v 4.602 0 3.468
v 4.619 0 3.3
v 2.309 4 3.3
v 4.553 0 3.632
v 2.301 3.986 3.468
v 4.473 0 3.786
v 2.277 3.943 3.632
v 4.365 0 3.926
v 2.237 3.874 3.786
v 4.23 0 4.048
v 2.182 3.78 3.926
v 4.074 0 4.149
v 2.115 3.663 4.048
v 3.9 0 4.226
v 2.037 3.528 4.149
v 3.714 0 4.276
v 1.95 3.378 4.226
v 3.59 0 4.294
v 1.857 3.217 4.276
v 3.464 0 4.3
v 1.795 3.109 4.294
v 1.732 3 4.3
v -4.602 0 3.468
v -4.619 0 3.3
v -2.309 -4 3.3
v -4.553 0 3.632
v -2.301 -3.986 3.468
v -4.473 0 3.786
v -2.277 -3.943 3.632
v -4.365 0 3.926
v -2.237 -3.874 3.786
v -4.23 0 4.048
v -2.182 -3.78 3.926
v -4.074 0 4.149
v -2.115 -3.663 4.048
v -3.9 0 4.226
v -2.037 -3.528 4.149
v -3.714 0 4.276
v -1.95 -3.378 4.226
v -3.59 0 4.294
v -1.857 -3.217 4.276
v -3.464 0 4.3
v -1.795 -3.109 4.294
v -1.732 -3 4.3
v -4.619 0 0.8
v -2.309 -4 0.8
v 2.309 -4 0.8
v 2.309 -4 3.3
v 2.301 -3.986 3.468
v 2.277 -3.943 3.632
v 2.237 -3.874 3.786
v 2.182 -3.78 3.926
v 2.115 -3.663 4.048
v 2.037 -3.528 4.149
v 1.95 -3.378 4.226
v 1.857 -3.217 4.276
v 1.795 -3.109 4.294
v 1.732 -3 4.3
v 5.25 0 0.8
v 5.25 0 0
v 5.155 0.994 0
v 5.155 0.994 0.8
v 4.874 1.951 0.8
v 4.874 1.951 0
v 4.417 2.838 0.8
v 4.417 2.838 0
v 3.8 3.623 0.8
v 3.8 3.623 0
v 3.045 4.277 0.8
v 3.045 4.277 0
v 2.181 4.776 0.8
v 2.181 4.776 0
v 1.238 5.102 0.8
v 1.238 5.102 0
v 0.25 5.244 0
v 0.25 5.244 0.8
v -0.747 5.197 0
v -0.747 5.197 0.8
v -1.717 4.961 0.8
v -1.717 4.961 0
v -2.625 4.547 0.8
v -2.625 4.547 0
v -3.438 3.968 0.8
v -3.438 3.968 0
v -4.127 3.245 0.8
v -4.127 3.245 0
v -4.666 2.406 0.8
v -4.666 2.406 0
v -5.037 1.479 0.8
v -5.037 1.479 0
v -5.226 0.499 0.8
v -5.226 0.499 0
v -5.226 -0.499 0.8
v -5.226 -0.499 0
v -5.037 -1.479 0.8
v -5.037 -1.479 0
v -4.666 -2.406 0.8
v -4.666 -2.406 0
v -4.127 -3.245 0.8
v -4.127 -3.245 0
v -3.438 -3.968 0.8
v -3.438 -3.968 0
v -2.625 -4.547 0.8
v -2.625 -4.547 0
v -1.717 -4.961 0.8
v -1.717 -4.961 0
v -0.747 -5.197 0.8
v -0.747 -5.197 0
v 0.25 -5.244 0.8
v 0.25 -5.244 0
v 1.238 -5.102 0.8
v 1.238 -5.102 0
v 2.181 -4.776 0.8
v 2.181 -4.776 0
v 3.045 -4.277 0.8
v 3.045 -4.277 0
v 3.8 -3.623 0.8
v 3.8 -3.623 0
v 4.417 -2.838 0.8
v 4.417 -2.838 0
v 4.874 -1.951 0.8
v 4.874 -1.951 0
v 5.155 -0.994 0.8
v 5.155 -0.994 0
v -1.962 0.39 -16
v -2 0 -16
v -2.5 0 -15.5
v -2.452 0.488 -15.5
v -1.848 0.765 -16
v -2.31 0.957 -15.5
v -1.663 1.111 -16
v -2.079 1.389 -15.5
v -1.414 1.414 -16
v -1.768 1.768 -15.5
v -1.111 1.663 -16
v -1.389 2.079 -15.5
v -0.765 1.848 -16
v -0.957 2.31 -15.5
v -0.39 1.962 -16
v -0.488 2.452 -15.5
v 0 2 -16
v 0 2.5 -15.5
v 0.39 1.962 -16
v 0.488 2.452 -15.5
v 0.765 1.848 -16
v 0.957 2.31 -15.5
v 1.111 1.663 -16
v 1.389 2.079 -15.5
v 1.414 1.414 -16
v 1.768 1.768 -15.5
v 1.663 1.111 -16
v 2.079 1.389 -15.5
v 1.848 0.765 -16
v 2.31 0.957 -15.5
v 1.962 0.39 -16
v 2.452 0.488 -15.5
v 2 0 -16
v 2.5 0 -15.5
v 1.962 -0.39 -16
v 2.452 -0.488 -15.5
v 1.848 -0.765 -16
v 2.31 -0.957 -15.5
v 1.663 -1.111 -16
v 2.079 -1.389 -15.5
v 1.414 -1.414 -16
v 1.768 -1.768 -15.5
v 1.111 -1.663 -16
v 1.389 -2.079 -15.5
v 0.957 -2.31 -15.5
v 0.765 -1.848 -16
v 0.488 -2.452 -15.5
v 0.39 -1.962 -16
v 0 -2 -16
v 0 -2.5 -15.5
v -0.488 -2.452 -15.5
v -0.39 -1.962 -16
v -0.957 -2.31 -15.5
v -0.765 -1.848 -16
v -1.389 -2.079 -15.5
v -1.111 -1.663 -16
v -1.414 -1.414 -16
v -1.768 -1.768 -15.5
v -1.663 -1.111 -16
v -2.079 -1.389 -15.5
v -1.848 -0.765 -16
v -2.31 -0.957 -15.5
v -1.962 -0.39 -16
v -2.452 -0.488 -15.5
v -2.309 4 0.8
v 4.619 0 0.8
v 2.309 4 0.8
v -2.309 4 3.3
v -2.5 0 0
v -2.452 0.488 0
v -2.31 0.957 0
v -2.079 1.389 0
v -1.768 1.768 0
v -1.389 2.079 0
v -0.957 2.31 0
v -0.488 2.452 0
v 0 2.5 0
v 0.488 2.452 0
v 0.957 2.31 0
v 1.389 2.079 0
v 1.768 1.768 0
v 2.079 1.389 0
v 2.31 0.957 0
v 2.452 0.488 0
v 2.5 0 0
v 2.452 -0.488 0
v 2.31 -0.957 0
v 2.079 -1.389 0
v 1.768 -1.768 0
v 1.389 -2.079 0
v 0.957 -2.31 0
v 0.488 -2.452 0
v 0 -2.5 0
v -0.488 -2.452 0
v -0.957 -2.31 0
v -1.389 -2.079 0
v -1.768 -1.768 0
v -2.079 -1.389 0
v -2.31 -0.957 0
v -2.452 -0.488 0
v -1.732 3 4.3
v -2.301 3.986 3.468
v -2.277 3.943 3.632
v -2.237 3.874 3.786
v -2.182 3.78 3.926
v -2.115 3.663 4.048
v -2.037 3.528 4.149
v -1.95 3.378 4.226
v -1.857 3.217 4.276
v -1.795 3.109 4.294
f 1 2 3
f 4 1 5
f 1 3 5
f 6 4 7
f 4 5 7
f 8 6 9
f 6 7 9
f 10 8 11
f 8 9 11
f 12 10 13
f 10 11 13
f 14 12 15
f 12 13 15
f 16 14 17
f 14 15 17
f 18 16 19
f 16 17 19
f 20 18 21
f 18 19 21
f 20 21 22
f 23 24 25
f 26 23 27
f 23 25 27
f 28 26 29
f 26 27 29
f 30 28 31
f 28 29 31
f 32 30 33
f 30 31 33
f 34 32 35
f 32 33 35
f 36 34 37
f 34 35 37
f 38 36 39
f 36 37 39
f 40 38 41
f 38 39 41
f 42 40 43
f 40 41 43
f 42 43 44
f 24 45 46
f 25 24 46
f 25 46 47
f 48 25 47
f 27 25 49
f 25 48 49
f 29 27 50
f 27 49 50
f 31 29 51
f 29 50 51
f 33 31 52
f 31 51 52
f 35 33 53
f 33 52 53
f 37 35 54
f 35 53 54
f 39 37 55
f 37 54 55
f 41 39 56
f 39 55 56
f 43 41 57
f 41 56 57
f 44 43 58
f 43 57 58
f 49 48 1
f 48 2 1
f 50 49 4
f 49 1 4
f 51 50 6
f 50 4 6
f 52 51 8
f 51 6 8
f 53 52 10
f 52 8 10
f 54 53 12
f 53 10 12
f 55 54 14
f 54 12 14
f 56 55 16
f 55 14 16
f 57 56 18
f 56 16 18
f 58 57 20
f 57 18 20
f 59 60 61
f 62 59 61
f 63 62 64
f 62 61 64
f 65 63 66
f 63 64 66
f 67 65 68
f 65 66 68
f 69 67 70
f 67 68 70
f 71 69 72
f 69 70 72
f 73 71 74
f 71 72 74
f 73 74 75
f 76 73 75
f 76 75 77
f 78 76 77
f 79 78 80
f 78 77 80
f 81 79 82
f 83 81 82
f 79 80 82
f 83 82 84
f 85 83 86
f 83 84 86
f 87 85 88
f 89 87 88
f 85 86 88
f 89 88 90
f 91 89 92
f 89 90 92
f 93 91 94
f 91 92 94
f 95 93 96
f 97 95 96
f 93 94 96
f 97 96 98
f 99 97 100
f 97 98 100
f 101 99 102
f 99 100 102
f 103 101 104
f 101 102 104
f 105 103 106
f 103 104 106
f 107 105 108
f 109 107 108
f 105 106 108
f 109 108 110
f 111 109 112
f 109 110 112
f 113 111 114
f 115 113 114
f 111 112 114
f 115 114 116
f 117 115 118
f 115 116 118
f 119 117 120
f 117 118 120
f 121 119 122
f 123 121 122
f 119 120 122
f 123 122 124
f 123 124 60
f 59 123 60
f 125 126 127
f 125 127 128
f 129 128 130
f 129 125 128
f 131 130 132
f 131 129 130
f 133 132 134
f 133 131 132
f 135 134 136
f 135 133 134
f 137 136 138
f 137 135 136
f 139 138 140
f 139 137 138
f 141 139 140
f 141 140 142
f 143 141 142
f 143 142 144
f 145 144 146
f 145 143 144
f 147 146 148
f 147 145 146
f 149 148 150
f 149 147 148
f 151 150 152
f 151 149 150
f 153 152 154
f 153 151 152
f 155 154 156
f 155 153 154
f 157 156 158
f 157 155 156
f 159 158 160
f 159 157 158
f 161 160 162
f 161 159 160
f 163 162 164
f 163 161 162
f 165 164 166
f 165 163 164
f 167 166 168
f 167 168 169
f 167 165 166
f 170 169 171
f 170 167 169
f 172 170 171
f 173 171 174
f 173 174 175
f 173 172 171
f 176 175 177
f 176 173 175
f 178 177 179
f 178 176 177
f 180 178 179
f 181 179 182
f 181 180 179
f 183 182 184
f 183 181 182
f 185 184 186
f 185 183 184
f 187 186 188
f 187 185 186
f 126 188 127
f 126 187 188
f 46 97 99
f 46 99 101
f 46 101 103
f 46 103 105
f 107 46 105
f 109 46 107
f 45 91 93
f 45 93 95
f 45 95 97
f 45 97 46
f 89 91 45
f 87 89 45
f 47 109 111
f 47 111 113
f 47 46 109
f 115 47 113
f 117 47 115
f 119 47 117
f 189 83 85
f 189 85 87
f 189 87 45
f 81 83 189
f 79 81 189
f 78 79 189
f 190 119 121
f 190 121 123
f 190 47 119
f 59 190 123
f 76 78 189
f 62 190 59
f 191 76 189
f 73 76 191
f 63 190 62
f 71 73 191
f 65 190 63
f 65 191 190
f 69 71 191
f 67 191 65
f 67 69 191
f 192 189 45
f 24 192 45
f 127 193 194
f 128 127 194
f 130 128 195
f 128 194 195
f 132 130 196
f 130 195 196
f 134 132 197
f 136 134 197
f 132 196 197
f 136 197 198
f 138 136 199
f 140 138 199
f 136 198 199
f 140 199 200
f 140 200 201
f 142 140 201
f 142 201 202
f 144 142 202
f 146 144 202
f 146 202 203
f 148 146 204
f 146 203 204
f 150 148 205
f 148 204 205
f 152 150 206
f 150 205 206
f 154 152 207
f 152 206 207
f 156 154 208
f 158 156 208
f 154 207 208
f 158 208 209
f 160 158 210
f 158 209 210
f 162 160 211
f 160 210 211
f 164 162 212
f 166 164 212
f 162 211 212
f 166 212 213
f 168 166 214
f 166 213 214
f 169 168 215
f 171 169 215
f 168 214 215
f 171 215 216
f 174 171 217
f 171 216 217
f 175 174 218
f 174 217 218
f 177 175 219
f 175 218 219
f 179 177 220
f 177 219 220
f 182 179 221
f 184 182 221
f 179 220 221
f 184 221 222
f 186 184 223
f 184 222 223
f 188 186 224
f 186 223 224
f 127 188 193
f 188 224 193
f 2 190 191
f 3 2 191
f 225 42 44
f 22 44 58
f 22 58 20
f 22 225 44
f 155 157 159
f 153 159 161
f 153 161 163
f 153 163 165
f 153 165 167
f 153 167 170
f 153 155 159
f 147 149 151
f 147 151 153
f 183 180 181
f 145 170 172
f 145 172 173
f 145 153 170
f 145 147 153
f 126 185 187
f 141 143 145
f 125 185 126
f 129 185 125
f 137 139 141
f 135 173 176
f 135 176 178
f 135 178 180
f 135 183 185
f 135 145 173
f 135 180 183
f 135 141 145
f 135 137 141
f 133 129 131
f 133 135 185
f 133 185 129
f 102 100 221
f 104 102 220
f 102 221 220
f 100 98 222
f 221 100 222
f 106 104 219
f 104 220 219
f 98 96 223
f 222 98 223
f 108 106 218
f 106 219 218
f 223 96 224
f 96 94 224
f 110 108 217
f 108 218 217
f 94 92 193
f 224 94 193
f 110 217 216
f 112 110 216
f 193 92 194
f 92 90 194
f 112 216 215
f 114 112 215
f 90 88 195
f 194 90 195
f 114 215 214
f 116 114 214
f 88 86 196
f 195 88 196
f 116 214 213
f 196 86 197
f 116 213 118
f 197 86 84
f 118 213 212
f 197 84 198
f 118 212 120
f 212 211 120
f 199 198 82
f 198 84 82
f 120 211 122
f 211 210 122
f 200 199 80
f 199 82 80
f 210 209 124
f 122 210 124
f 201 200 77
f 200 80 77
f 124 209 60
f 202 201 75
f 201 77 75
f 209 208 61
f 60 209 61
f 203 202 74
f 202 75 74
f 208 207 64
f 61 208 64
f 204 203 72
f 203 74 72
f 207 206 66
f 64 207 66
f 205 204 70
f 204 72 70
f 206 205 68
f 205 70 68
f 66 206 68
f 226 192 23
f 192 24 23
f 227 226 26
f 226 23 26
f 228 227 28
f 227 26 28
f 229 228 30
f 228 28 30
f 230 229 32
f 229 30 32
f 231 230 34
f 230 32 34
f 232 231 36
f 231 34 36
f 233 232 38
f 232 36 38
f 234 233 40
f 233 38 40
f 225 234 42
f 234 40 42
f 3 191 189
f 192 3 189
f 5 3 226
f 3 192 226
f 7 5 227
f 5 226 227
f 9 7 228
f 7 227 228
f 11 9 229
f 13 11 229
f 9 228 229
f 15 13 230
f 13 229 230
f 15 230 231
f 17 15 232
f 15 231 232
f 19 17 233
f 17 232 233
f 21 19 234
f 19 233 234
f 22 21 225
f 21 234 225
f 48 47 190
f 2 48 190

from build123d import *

# Parameters (mm, degrees)
SKETCH_2_R      = 5.25
EXTRUDE_1_DEPTH = 0.8
EXTRUDE_2_DEPTH = 3.5
SKETCH_4_R      = 2.5
EXTRUDE_3_DEPTH = 16
FILLET_1_R      = 1
CHAMFER_1_SIZE  = 0.5


with BuildPart() as part:
    # Эскиз2 → Бобышка-Вытянуть1 (new body)
    with BuildSketch(Plane.XY):
        Circle(SKETCH_2_R)
    extrude(amount=EXTRUDE_1_DEPTH)

    # Эскиз3 → Бобышка-Вытянуть2 (add)
    with BuildSketch(Plane.XY.offset(0.8)):
        Polygon((-2.309401077, 4), (-4.618802154, 0), (-2.309401077, -4), (2.309401077, -4), (4.618802154, 0), (2.309401077, 4), align=None)
    extrude(amount=EXTRUDE_2_DEPTH)

    # Эскиз4 → Бобышка-Вытянуть3 (add)
    with BuildSketch(Plane(origin=(0, 0, 0), x_dir=(-1, 0, 0), z_dir=(0, 0, -1))):
        Circle(SKETCH_4_R)
    extrude(amount=EXTRUDE_3_DEPTH)

    # Скругление1
    fillet_1_edges = [part.edges().sort_by_distance(p)[0] for p in [
        (0, 4, 4.3),
        (-3.464101615, 2, 4.3),
        (-3.464101615, -2, 4.3),
        (0, -4, 4.3),
        (3.464101615, -2, 4.3),
        (3.464101615, 2, 4.3),
    ]]
    fillet(fillet_1_edges, radius=FILLET_1_R)

    # Фаска1
    chamfer_1_edges = [part.edges().sort_by_distance(p)[0] for p in [
        (2.5, 0, -16),
    ]]
    chamfer(chamfer_1_edges, length=CHAMFER_1_SIZE)


solid = part.part
